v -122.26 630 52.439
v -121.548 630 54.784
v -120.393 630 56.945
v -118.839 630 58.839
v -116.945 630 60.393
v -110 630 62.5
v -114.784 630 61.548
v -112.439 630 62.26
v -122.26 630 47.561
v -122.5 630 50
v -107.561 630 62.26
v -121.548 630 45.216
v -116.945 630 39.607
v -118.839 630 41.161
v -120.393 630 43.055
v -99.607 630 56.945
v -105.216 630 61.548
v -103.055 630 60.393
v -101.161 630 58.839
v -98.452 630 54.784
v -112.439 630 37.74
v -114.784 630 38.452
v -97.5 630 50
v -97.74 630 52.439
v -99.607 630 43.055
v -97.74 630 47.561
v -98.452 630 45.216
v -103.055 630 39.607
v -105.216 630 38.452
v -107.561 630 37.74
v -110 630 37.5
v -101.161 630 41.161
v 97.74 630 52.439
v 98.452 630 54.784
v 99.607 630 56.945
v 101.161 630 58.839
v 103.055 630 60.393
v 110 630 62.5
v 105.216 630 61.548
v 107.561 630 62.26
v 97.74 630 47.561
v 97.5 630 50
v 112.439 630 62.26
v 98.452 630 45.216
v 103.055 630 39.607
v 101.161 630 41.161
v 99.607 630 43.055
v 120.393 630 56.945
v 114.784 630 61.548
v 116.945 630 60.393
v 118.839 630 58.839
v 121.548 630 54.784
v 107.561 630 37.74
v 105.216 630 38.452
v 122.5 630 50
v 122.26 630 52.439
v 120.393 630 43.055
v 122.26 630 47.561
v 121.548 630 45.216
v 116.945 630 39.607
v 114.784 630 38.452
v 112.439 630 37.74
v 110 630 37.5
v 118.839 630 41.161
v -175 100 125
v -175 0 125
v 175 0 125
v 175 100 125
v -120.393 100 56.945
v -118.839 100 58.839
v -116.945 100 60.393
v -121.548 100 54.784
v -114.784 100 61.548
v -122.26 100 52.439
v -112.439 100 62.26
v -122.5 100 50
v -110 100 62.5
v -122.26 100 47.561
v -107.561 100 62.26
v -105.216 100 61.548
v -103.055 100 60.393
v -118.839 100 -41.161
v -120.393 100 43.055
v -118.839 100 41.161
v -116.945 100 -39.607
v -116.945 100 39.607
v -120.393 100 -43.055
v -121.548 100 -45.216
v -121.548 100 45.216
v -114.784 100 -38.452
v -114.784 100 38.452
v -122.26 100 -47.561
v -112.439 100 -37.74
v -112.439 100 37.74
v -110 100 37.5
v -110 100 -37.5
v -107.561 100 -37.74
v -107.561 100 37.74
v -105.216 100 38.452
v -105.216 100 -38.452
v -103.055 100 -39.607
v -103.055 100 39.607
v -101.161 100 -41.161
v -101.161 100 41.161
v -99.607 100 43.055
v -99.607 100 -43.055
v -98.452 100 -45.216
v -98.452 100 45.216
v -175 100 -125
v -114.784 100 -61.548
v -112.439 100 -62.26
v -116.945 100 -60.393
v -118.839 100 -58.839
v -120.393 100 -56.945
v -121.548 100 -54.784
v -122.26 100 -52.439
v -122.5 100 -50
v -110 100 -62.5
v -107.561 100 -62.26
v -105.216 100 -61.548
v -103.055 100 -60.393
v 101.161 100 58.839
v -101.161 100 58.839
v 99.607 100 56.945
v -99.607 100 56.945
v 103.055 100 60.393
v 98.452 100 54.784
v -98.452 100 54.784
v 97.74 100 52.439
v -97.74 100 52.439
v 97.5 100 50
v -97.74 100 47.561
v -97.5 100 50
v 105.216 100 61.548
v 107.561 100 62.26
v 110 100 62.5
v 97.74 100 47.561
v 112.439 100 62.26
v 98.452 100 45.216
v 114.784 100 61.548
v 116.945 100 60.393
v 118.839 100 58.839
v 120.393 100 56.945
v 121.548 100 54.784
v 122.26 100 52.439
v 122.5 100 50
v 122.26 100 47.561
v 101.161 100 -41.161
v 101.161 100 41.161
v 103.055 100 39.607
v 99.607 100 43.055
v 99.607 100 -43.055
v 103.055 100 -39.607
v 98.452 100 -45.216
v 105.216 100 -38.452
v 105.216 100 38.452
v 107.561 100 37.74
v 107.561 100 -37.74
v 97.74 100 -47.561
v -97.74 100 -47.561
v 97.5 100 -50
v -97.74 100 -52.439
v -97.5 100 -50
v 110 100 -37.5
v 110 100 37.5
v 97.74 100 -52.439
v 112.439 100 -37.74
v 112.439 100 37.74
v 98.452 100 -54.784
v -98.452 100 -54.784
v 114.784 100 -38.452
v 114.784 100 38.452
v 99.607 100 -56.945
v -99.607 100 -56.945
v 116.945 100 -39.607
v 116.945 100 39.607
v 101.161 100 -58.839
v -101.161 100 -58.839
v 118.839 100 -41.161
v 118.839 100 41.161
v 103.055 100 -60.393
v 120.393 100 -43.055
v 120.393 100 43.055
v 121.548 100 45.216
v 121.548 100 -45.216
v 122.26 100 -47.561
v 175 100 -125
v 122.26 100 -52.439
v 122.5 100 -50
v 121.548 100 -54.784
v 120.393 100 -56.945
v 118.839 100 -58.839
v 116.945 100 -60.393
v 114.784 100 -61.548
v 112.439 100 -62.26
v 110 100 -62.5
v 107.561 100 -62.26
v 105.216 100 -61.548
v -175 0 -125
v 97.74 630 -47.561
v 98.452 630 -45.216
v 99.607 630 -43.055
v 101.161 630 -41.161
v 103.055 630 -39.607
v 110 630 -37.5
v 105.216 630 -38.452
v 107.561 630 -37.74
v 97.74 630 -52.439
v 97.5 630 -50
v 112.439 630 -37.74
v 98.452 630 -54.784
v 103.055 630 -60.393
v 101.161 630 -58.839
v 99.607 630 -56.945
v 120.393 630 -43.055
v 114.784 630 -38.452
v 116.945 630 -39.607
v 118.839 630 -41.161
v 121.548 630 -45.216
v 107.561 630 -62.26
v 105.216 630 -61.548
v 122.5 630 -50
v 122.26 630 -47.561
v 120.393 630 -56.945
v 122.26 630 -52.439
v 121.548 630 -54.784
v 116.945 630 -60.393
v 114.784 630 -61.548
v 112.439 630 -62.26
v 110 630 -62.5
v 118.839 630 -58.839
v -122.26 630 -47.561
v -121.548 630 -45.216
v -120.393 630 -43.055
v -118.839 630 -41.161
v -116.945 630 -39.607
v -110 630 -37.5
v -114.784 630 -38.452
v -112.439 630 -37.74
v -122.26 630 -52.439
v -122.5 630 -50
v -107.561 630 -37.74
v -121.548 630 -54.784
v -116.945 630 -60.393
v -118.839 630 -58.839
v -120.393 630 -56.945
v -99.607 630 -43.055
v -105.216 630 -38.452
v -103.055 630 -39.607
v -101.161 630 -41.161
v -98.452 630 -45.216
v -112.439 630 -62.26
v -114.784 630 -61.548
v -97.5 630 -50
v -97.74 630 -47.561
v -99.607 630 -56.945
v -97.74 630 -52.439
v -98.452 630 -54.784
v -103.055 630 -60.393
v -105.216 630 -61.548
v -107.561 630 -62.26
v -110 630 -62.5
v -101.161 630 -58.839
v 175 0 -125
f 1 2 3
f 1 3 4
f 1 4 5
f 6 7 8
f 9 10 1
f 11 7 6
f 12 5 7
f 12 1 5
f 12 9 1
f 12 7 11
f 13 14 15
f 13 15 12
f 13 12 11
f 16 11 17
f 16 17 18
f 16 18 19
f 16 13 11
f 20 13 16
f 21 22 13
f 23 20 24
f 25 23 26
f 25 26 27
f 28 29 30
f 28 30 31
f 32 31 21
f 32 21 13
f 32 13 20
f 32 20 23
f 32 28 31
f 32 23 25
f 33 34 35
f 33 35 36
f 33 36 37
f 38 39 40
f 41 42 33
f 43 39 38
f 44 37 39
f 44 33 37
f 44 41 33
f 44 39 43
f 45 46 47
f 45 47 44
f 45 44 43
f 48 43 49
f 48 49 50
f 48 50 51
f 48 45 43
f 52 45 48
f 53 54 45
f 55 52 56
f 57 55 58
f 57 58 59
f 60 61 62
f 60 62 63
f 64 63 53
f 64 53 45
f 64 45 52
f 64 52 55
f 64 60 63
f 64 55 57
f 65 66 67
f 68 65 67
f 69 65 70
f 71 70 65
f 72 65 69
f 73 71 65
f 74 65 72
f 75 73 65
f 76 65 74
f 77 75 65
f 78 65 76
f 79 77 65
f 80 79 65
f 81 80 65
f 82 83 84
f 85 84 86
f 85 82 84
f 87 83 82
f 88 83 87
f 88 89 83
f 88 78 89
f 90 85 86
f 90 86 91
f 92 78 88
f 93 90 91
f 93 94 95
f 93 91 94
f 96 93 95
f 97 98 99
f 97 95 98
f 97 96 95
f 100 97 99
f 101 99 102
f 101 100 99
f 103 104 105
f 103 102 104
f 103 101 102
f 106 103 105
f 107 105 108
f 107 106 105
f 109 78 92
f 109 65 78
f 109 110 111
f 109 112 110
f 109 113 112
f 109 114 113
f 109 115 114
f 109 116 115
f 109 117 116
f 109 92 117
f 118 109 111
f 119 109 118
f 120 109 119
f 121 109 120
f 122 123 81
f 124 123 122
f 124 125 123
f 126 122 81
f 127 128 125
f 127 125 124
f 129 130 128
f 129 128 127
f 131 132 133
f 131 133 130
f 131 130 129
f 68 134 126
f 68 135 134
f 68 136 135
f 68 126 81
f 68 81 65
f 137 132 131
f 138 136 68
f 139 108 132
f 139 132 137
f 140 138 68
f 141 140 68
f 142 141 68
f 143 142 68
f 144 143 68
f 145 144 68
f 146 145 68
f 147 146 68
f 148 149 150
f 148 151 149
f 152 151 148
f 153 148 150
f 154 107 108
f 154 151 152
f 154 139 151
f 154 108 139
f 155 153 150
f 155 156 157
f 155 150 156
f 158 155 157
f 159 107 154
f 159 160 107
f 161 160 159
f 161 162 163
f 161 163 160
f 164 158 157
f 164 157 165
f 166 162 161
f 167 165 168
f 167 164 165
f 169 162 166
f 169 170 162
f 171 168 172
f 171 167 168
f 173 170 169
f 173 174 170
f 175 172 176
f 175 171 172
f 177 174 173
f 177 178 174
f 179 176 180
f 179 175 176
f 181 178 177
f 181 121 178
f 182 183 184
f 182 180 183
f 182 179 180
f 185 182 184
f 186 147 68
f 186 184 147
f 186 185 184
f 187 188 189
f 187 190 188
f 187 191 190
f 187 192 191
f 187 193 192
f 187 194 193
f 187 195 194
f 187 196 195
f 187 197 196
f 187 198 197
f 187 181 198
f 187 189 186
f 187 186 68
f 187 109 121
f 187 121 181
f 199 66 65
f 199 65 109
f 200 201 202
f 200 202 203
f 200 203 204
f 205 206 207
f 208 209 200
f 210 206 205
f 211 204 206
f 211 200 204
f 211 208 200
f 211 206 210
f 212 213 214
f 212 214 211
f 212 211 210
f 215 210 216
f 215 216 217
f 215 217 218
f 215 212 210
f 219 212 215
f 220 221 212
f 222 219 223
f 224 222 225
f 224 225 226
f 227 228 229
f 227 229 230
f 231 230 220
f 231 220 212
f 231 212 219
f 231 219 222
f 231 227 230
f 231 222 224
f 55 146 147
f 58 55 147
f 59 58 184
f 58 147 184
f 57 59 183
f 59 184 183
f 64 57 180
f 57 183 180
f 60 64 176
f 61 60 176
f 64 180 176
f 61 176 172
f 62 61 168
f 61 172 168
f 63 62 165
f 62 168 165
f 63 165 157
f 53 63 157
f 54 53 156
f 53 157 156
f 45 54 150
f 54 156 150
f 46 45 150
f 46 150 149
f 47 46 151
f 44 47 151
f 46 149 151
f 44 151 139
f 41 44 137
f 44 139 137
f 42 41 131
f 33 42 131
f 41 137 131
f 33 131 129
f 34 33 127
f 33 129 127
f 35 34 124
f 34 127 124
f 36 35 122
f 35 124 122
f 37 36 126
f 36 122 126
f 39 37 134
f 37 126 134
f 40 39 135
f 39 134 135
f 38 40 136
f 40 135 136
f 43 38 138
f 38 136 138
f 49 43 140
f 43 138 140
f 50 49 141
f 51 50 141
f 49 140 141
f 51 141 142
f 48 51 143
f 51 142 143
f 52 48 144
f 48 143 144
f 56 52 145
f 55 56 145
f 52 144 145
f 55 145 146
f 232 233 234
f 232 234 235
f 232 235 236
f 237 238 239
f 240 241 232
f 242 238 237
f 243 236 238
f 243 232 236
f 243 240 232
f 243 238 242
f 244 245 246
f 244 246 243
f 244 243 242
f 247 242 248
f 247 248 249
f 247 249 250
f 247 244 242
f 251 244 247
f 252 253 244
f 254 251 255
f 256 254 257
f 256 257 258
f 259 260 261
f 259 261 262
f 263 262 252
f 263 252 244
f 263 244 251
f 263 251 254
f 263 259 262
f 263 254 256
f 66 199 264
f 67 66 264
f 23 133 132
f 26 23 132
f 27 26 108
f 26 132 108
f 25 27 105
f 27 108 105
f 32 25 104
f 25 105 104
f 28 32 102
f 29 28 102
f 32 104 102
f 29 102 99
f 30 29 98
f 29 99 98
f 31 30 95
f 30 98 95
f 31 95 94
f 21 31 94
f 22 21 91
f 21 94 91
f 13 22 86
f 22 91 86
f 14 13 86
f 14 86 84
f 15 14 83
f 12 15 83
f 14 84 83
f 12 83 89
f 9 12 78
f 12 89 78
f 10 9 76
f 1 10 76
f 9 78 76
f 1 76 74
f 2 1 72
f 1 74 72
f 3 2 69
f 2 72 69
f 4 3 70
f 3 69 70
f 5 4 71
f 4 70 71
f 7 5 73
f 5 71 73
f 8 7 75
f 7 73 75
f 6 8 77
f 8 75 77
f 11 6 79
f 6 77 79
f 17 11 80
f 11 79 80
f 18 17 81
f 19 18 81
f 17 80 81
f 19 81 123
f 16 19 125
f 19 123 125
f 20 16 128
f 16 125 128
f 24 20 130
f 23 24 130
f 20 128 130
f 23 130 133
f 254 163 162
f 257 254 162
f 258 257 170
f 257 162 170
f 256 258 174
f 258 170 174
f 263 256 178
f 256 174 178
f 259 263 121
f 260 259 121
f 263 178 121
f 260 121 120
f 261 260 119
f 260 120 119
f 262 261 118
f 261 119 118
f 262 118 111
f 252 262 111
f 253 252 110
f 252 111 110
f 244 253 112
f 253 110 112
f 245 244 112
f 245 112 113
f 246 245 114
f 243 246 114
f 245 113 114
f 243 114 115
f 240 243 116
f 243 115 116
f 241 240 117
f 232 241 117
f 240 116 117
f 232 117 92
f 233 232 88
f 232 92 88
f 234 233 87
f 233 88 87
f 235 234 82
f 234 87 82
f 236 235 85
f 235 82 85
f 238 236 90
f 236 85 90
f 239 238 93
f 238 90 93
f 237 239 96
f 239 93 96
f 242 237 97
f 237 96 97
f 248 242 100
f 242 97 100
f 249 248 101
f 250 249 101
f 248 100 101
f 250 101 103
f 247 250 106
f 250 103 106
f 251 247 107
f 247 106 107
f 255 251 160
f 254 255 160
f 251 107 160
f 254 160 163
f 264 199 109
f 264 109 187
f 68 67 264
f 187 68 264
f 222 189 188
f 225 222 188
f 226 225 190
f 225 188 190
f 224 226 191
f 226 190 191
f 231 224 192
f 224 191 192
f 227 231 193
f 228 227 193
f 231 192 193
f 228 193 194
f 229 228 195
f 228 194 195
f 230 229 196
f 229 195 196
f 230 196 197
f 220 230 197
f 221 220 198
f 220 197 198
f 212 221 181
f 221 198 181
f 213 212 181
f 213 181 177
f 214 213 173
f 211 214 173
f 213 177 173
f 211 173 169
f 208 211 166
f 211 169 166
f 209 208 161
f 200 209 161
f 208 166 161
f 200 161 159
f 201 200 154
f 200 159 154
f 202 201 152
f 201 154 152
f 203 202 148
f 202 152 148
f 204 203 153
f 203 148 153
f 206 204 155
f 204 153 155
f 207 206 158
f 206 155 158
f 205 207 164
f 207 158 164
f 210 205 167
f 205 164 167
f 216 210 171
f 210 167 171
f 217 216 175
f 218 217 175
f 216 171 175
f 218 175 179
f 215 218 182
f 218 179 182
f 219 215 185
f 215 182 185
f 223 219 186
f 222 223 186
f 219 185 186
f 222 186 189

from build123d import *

# Parameters (mm, degrees)
SKETCH1_W           = 350
SKETCH1_H           = 250
BOSS_EXTRUDE1_DEPTH = 100
SKETCH3_R           = 12.5
BOSS_EXTRUDE2_DEPTH = 530


with BuildPart() as part:
    # Sketch1 → Boss-Extrude1 (new body)
    with BuildSketch(Plane(origin=(0, 0, 0), x_dir=(1, 0, 0), z_dir=(0, 1, 0))):
        Rectangle(SKETCH1_W, SKETCH1_H)
    extrude(amount=BOSS_EXTRUDE1_DEPTH)

    # Sketch3 → Boss-Extrude2 (add)
    with BuildSketch(Plane(origin=(0, 100, 0), x_dir=(1, 0, 0), z_dir=(0, 1, 0))):
        with Locations((-110, 50)):
            Circle(SKETCH3_R)
        with Locations((110, 50)):
            Circle(SKETCH3_R)
        with Locations((110, -50)):
            Circle(SKETCH3_R)
        with Locations((-110, -50)):
            Circle(SKETCH3_R)
    extrude(amount=BOSS_EXTRUDE2_DEPTH)


solid = part.part
